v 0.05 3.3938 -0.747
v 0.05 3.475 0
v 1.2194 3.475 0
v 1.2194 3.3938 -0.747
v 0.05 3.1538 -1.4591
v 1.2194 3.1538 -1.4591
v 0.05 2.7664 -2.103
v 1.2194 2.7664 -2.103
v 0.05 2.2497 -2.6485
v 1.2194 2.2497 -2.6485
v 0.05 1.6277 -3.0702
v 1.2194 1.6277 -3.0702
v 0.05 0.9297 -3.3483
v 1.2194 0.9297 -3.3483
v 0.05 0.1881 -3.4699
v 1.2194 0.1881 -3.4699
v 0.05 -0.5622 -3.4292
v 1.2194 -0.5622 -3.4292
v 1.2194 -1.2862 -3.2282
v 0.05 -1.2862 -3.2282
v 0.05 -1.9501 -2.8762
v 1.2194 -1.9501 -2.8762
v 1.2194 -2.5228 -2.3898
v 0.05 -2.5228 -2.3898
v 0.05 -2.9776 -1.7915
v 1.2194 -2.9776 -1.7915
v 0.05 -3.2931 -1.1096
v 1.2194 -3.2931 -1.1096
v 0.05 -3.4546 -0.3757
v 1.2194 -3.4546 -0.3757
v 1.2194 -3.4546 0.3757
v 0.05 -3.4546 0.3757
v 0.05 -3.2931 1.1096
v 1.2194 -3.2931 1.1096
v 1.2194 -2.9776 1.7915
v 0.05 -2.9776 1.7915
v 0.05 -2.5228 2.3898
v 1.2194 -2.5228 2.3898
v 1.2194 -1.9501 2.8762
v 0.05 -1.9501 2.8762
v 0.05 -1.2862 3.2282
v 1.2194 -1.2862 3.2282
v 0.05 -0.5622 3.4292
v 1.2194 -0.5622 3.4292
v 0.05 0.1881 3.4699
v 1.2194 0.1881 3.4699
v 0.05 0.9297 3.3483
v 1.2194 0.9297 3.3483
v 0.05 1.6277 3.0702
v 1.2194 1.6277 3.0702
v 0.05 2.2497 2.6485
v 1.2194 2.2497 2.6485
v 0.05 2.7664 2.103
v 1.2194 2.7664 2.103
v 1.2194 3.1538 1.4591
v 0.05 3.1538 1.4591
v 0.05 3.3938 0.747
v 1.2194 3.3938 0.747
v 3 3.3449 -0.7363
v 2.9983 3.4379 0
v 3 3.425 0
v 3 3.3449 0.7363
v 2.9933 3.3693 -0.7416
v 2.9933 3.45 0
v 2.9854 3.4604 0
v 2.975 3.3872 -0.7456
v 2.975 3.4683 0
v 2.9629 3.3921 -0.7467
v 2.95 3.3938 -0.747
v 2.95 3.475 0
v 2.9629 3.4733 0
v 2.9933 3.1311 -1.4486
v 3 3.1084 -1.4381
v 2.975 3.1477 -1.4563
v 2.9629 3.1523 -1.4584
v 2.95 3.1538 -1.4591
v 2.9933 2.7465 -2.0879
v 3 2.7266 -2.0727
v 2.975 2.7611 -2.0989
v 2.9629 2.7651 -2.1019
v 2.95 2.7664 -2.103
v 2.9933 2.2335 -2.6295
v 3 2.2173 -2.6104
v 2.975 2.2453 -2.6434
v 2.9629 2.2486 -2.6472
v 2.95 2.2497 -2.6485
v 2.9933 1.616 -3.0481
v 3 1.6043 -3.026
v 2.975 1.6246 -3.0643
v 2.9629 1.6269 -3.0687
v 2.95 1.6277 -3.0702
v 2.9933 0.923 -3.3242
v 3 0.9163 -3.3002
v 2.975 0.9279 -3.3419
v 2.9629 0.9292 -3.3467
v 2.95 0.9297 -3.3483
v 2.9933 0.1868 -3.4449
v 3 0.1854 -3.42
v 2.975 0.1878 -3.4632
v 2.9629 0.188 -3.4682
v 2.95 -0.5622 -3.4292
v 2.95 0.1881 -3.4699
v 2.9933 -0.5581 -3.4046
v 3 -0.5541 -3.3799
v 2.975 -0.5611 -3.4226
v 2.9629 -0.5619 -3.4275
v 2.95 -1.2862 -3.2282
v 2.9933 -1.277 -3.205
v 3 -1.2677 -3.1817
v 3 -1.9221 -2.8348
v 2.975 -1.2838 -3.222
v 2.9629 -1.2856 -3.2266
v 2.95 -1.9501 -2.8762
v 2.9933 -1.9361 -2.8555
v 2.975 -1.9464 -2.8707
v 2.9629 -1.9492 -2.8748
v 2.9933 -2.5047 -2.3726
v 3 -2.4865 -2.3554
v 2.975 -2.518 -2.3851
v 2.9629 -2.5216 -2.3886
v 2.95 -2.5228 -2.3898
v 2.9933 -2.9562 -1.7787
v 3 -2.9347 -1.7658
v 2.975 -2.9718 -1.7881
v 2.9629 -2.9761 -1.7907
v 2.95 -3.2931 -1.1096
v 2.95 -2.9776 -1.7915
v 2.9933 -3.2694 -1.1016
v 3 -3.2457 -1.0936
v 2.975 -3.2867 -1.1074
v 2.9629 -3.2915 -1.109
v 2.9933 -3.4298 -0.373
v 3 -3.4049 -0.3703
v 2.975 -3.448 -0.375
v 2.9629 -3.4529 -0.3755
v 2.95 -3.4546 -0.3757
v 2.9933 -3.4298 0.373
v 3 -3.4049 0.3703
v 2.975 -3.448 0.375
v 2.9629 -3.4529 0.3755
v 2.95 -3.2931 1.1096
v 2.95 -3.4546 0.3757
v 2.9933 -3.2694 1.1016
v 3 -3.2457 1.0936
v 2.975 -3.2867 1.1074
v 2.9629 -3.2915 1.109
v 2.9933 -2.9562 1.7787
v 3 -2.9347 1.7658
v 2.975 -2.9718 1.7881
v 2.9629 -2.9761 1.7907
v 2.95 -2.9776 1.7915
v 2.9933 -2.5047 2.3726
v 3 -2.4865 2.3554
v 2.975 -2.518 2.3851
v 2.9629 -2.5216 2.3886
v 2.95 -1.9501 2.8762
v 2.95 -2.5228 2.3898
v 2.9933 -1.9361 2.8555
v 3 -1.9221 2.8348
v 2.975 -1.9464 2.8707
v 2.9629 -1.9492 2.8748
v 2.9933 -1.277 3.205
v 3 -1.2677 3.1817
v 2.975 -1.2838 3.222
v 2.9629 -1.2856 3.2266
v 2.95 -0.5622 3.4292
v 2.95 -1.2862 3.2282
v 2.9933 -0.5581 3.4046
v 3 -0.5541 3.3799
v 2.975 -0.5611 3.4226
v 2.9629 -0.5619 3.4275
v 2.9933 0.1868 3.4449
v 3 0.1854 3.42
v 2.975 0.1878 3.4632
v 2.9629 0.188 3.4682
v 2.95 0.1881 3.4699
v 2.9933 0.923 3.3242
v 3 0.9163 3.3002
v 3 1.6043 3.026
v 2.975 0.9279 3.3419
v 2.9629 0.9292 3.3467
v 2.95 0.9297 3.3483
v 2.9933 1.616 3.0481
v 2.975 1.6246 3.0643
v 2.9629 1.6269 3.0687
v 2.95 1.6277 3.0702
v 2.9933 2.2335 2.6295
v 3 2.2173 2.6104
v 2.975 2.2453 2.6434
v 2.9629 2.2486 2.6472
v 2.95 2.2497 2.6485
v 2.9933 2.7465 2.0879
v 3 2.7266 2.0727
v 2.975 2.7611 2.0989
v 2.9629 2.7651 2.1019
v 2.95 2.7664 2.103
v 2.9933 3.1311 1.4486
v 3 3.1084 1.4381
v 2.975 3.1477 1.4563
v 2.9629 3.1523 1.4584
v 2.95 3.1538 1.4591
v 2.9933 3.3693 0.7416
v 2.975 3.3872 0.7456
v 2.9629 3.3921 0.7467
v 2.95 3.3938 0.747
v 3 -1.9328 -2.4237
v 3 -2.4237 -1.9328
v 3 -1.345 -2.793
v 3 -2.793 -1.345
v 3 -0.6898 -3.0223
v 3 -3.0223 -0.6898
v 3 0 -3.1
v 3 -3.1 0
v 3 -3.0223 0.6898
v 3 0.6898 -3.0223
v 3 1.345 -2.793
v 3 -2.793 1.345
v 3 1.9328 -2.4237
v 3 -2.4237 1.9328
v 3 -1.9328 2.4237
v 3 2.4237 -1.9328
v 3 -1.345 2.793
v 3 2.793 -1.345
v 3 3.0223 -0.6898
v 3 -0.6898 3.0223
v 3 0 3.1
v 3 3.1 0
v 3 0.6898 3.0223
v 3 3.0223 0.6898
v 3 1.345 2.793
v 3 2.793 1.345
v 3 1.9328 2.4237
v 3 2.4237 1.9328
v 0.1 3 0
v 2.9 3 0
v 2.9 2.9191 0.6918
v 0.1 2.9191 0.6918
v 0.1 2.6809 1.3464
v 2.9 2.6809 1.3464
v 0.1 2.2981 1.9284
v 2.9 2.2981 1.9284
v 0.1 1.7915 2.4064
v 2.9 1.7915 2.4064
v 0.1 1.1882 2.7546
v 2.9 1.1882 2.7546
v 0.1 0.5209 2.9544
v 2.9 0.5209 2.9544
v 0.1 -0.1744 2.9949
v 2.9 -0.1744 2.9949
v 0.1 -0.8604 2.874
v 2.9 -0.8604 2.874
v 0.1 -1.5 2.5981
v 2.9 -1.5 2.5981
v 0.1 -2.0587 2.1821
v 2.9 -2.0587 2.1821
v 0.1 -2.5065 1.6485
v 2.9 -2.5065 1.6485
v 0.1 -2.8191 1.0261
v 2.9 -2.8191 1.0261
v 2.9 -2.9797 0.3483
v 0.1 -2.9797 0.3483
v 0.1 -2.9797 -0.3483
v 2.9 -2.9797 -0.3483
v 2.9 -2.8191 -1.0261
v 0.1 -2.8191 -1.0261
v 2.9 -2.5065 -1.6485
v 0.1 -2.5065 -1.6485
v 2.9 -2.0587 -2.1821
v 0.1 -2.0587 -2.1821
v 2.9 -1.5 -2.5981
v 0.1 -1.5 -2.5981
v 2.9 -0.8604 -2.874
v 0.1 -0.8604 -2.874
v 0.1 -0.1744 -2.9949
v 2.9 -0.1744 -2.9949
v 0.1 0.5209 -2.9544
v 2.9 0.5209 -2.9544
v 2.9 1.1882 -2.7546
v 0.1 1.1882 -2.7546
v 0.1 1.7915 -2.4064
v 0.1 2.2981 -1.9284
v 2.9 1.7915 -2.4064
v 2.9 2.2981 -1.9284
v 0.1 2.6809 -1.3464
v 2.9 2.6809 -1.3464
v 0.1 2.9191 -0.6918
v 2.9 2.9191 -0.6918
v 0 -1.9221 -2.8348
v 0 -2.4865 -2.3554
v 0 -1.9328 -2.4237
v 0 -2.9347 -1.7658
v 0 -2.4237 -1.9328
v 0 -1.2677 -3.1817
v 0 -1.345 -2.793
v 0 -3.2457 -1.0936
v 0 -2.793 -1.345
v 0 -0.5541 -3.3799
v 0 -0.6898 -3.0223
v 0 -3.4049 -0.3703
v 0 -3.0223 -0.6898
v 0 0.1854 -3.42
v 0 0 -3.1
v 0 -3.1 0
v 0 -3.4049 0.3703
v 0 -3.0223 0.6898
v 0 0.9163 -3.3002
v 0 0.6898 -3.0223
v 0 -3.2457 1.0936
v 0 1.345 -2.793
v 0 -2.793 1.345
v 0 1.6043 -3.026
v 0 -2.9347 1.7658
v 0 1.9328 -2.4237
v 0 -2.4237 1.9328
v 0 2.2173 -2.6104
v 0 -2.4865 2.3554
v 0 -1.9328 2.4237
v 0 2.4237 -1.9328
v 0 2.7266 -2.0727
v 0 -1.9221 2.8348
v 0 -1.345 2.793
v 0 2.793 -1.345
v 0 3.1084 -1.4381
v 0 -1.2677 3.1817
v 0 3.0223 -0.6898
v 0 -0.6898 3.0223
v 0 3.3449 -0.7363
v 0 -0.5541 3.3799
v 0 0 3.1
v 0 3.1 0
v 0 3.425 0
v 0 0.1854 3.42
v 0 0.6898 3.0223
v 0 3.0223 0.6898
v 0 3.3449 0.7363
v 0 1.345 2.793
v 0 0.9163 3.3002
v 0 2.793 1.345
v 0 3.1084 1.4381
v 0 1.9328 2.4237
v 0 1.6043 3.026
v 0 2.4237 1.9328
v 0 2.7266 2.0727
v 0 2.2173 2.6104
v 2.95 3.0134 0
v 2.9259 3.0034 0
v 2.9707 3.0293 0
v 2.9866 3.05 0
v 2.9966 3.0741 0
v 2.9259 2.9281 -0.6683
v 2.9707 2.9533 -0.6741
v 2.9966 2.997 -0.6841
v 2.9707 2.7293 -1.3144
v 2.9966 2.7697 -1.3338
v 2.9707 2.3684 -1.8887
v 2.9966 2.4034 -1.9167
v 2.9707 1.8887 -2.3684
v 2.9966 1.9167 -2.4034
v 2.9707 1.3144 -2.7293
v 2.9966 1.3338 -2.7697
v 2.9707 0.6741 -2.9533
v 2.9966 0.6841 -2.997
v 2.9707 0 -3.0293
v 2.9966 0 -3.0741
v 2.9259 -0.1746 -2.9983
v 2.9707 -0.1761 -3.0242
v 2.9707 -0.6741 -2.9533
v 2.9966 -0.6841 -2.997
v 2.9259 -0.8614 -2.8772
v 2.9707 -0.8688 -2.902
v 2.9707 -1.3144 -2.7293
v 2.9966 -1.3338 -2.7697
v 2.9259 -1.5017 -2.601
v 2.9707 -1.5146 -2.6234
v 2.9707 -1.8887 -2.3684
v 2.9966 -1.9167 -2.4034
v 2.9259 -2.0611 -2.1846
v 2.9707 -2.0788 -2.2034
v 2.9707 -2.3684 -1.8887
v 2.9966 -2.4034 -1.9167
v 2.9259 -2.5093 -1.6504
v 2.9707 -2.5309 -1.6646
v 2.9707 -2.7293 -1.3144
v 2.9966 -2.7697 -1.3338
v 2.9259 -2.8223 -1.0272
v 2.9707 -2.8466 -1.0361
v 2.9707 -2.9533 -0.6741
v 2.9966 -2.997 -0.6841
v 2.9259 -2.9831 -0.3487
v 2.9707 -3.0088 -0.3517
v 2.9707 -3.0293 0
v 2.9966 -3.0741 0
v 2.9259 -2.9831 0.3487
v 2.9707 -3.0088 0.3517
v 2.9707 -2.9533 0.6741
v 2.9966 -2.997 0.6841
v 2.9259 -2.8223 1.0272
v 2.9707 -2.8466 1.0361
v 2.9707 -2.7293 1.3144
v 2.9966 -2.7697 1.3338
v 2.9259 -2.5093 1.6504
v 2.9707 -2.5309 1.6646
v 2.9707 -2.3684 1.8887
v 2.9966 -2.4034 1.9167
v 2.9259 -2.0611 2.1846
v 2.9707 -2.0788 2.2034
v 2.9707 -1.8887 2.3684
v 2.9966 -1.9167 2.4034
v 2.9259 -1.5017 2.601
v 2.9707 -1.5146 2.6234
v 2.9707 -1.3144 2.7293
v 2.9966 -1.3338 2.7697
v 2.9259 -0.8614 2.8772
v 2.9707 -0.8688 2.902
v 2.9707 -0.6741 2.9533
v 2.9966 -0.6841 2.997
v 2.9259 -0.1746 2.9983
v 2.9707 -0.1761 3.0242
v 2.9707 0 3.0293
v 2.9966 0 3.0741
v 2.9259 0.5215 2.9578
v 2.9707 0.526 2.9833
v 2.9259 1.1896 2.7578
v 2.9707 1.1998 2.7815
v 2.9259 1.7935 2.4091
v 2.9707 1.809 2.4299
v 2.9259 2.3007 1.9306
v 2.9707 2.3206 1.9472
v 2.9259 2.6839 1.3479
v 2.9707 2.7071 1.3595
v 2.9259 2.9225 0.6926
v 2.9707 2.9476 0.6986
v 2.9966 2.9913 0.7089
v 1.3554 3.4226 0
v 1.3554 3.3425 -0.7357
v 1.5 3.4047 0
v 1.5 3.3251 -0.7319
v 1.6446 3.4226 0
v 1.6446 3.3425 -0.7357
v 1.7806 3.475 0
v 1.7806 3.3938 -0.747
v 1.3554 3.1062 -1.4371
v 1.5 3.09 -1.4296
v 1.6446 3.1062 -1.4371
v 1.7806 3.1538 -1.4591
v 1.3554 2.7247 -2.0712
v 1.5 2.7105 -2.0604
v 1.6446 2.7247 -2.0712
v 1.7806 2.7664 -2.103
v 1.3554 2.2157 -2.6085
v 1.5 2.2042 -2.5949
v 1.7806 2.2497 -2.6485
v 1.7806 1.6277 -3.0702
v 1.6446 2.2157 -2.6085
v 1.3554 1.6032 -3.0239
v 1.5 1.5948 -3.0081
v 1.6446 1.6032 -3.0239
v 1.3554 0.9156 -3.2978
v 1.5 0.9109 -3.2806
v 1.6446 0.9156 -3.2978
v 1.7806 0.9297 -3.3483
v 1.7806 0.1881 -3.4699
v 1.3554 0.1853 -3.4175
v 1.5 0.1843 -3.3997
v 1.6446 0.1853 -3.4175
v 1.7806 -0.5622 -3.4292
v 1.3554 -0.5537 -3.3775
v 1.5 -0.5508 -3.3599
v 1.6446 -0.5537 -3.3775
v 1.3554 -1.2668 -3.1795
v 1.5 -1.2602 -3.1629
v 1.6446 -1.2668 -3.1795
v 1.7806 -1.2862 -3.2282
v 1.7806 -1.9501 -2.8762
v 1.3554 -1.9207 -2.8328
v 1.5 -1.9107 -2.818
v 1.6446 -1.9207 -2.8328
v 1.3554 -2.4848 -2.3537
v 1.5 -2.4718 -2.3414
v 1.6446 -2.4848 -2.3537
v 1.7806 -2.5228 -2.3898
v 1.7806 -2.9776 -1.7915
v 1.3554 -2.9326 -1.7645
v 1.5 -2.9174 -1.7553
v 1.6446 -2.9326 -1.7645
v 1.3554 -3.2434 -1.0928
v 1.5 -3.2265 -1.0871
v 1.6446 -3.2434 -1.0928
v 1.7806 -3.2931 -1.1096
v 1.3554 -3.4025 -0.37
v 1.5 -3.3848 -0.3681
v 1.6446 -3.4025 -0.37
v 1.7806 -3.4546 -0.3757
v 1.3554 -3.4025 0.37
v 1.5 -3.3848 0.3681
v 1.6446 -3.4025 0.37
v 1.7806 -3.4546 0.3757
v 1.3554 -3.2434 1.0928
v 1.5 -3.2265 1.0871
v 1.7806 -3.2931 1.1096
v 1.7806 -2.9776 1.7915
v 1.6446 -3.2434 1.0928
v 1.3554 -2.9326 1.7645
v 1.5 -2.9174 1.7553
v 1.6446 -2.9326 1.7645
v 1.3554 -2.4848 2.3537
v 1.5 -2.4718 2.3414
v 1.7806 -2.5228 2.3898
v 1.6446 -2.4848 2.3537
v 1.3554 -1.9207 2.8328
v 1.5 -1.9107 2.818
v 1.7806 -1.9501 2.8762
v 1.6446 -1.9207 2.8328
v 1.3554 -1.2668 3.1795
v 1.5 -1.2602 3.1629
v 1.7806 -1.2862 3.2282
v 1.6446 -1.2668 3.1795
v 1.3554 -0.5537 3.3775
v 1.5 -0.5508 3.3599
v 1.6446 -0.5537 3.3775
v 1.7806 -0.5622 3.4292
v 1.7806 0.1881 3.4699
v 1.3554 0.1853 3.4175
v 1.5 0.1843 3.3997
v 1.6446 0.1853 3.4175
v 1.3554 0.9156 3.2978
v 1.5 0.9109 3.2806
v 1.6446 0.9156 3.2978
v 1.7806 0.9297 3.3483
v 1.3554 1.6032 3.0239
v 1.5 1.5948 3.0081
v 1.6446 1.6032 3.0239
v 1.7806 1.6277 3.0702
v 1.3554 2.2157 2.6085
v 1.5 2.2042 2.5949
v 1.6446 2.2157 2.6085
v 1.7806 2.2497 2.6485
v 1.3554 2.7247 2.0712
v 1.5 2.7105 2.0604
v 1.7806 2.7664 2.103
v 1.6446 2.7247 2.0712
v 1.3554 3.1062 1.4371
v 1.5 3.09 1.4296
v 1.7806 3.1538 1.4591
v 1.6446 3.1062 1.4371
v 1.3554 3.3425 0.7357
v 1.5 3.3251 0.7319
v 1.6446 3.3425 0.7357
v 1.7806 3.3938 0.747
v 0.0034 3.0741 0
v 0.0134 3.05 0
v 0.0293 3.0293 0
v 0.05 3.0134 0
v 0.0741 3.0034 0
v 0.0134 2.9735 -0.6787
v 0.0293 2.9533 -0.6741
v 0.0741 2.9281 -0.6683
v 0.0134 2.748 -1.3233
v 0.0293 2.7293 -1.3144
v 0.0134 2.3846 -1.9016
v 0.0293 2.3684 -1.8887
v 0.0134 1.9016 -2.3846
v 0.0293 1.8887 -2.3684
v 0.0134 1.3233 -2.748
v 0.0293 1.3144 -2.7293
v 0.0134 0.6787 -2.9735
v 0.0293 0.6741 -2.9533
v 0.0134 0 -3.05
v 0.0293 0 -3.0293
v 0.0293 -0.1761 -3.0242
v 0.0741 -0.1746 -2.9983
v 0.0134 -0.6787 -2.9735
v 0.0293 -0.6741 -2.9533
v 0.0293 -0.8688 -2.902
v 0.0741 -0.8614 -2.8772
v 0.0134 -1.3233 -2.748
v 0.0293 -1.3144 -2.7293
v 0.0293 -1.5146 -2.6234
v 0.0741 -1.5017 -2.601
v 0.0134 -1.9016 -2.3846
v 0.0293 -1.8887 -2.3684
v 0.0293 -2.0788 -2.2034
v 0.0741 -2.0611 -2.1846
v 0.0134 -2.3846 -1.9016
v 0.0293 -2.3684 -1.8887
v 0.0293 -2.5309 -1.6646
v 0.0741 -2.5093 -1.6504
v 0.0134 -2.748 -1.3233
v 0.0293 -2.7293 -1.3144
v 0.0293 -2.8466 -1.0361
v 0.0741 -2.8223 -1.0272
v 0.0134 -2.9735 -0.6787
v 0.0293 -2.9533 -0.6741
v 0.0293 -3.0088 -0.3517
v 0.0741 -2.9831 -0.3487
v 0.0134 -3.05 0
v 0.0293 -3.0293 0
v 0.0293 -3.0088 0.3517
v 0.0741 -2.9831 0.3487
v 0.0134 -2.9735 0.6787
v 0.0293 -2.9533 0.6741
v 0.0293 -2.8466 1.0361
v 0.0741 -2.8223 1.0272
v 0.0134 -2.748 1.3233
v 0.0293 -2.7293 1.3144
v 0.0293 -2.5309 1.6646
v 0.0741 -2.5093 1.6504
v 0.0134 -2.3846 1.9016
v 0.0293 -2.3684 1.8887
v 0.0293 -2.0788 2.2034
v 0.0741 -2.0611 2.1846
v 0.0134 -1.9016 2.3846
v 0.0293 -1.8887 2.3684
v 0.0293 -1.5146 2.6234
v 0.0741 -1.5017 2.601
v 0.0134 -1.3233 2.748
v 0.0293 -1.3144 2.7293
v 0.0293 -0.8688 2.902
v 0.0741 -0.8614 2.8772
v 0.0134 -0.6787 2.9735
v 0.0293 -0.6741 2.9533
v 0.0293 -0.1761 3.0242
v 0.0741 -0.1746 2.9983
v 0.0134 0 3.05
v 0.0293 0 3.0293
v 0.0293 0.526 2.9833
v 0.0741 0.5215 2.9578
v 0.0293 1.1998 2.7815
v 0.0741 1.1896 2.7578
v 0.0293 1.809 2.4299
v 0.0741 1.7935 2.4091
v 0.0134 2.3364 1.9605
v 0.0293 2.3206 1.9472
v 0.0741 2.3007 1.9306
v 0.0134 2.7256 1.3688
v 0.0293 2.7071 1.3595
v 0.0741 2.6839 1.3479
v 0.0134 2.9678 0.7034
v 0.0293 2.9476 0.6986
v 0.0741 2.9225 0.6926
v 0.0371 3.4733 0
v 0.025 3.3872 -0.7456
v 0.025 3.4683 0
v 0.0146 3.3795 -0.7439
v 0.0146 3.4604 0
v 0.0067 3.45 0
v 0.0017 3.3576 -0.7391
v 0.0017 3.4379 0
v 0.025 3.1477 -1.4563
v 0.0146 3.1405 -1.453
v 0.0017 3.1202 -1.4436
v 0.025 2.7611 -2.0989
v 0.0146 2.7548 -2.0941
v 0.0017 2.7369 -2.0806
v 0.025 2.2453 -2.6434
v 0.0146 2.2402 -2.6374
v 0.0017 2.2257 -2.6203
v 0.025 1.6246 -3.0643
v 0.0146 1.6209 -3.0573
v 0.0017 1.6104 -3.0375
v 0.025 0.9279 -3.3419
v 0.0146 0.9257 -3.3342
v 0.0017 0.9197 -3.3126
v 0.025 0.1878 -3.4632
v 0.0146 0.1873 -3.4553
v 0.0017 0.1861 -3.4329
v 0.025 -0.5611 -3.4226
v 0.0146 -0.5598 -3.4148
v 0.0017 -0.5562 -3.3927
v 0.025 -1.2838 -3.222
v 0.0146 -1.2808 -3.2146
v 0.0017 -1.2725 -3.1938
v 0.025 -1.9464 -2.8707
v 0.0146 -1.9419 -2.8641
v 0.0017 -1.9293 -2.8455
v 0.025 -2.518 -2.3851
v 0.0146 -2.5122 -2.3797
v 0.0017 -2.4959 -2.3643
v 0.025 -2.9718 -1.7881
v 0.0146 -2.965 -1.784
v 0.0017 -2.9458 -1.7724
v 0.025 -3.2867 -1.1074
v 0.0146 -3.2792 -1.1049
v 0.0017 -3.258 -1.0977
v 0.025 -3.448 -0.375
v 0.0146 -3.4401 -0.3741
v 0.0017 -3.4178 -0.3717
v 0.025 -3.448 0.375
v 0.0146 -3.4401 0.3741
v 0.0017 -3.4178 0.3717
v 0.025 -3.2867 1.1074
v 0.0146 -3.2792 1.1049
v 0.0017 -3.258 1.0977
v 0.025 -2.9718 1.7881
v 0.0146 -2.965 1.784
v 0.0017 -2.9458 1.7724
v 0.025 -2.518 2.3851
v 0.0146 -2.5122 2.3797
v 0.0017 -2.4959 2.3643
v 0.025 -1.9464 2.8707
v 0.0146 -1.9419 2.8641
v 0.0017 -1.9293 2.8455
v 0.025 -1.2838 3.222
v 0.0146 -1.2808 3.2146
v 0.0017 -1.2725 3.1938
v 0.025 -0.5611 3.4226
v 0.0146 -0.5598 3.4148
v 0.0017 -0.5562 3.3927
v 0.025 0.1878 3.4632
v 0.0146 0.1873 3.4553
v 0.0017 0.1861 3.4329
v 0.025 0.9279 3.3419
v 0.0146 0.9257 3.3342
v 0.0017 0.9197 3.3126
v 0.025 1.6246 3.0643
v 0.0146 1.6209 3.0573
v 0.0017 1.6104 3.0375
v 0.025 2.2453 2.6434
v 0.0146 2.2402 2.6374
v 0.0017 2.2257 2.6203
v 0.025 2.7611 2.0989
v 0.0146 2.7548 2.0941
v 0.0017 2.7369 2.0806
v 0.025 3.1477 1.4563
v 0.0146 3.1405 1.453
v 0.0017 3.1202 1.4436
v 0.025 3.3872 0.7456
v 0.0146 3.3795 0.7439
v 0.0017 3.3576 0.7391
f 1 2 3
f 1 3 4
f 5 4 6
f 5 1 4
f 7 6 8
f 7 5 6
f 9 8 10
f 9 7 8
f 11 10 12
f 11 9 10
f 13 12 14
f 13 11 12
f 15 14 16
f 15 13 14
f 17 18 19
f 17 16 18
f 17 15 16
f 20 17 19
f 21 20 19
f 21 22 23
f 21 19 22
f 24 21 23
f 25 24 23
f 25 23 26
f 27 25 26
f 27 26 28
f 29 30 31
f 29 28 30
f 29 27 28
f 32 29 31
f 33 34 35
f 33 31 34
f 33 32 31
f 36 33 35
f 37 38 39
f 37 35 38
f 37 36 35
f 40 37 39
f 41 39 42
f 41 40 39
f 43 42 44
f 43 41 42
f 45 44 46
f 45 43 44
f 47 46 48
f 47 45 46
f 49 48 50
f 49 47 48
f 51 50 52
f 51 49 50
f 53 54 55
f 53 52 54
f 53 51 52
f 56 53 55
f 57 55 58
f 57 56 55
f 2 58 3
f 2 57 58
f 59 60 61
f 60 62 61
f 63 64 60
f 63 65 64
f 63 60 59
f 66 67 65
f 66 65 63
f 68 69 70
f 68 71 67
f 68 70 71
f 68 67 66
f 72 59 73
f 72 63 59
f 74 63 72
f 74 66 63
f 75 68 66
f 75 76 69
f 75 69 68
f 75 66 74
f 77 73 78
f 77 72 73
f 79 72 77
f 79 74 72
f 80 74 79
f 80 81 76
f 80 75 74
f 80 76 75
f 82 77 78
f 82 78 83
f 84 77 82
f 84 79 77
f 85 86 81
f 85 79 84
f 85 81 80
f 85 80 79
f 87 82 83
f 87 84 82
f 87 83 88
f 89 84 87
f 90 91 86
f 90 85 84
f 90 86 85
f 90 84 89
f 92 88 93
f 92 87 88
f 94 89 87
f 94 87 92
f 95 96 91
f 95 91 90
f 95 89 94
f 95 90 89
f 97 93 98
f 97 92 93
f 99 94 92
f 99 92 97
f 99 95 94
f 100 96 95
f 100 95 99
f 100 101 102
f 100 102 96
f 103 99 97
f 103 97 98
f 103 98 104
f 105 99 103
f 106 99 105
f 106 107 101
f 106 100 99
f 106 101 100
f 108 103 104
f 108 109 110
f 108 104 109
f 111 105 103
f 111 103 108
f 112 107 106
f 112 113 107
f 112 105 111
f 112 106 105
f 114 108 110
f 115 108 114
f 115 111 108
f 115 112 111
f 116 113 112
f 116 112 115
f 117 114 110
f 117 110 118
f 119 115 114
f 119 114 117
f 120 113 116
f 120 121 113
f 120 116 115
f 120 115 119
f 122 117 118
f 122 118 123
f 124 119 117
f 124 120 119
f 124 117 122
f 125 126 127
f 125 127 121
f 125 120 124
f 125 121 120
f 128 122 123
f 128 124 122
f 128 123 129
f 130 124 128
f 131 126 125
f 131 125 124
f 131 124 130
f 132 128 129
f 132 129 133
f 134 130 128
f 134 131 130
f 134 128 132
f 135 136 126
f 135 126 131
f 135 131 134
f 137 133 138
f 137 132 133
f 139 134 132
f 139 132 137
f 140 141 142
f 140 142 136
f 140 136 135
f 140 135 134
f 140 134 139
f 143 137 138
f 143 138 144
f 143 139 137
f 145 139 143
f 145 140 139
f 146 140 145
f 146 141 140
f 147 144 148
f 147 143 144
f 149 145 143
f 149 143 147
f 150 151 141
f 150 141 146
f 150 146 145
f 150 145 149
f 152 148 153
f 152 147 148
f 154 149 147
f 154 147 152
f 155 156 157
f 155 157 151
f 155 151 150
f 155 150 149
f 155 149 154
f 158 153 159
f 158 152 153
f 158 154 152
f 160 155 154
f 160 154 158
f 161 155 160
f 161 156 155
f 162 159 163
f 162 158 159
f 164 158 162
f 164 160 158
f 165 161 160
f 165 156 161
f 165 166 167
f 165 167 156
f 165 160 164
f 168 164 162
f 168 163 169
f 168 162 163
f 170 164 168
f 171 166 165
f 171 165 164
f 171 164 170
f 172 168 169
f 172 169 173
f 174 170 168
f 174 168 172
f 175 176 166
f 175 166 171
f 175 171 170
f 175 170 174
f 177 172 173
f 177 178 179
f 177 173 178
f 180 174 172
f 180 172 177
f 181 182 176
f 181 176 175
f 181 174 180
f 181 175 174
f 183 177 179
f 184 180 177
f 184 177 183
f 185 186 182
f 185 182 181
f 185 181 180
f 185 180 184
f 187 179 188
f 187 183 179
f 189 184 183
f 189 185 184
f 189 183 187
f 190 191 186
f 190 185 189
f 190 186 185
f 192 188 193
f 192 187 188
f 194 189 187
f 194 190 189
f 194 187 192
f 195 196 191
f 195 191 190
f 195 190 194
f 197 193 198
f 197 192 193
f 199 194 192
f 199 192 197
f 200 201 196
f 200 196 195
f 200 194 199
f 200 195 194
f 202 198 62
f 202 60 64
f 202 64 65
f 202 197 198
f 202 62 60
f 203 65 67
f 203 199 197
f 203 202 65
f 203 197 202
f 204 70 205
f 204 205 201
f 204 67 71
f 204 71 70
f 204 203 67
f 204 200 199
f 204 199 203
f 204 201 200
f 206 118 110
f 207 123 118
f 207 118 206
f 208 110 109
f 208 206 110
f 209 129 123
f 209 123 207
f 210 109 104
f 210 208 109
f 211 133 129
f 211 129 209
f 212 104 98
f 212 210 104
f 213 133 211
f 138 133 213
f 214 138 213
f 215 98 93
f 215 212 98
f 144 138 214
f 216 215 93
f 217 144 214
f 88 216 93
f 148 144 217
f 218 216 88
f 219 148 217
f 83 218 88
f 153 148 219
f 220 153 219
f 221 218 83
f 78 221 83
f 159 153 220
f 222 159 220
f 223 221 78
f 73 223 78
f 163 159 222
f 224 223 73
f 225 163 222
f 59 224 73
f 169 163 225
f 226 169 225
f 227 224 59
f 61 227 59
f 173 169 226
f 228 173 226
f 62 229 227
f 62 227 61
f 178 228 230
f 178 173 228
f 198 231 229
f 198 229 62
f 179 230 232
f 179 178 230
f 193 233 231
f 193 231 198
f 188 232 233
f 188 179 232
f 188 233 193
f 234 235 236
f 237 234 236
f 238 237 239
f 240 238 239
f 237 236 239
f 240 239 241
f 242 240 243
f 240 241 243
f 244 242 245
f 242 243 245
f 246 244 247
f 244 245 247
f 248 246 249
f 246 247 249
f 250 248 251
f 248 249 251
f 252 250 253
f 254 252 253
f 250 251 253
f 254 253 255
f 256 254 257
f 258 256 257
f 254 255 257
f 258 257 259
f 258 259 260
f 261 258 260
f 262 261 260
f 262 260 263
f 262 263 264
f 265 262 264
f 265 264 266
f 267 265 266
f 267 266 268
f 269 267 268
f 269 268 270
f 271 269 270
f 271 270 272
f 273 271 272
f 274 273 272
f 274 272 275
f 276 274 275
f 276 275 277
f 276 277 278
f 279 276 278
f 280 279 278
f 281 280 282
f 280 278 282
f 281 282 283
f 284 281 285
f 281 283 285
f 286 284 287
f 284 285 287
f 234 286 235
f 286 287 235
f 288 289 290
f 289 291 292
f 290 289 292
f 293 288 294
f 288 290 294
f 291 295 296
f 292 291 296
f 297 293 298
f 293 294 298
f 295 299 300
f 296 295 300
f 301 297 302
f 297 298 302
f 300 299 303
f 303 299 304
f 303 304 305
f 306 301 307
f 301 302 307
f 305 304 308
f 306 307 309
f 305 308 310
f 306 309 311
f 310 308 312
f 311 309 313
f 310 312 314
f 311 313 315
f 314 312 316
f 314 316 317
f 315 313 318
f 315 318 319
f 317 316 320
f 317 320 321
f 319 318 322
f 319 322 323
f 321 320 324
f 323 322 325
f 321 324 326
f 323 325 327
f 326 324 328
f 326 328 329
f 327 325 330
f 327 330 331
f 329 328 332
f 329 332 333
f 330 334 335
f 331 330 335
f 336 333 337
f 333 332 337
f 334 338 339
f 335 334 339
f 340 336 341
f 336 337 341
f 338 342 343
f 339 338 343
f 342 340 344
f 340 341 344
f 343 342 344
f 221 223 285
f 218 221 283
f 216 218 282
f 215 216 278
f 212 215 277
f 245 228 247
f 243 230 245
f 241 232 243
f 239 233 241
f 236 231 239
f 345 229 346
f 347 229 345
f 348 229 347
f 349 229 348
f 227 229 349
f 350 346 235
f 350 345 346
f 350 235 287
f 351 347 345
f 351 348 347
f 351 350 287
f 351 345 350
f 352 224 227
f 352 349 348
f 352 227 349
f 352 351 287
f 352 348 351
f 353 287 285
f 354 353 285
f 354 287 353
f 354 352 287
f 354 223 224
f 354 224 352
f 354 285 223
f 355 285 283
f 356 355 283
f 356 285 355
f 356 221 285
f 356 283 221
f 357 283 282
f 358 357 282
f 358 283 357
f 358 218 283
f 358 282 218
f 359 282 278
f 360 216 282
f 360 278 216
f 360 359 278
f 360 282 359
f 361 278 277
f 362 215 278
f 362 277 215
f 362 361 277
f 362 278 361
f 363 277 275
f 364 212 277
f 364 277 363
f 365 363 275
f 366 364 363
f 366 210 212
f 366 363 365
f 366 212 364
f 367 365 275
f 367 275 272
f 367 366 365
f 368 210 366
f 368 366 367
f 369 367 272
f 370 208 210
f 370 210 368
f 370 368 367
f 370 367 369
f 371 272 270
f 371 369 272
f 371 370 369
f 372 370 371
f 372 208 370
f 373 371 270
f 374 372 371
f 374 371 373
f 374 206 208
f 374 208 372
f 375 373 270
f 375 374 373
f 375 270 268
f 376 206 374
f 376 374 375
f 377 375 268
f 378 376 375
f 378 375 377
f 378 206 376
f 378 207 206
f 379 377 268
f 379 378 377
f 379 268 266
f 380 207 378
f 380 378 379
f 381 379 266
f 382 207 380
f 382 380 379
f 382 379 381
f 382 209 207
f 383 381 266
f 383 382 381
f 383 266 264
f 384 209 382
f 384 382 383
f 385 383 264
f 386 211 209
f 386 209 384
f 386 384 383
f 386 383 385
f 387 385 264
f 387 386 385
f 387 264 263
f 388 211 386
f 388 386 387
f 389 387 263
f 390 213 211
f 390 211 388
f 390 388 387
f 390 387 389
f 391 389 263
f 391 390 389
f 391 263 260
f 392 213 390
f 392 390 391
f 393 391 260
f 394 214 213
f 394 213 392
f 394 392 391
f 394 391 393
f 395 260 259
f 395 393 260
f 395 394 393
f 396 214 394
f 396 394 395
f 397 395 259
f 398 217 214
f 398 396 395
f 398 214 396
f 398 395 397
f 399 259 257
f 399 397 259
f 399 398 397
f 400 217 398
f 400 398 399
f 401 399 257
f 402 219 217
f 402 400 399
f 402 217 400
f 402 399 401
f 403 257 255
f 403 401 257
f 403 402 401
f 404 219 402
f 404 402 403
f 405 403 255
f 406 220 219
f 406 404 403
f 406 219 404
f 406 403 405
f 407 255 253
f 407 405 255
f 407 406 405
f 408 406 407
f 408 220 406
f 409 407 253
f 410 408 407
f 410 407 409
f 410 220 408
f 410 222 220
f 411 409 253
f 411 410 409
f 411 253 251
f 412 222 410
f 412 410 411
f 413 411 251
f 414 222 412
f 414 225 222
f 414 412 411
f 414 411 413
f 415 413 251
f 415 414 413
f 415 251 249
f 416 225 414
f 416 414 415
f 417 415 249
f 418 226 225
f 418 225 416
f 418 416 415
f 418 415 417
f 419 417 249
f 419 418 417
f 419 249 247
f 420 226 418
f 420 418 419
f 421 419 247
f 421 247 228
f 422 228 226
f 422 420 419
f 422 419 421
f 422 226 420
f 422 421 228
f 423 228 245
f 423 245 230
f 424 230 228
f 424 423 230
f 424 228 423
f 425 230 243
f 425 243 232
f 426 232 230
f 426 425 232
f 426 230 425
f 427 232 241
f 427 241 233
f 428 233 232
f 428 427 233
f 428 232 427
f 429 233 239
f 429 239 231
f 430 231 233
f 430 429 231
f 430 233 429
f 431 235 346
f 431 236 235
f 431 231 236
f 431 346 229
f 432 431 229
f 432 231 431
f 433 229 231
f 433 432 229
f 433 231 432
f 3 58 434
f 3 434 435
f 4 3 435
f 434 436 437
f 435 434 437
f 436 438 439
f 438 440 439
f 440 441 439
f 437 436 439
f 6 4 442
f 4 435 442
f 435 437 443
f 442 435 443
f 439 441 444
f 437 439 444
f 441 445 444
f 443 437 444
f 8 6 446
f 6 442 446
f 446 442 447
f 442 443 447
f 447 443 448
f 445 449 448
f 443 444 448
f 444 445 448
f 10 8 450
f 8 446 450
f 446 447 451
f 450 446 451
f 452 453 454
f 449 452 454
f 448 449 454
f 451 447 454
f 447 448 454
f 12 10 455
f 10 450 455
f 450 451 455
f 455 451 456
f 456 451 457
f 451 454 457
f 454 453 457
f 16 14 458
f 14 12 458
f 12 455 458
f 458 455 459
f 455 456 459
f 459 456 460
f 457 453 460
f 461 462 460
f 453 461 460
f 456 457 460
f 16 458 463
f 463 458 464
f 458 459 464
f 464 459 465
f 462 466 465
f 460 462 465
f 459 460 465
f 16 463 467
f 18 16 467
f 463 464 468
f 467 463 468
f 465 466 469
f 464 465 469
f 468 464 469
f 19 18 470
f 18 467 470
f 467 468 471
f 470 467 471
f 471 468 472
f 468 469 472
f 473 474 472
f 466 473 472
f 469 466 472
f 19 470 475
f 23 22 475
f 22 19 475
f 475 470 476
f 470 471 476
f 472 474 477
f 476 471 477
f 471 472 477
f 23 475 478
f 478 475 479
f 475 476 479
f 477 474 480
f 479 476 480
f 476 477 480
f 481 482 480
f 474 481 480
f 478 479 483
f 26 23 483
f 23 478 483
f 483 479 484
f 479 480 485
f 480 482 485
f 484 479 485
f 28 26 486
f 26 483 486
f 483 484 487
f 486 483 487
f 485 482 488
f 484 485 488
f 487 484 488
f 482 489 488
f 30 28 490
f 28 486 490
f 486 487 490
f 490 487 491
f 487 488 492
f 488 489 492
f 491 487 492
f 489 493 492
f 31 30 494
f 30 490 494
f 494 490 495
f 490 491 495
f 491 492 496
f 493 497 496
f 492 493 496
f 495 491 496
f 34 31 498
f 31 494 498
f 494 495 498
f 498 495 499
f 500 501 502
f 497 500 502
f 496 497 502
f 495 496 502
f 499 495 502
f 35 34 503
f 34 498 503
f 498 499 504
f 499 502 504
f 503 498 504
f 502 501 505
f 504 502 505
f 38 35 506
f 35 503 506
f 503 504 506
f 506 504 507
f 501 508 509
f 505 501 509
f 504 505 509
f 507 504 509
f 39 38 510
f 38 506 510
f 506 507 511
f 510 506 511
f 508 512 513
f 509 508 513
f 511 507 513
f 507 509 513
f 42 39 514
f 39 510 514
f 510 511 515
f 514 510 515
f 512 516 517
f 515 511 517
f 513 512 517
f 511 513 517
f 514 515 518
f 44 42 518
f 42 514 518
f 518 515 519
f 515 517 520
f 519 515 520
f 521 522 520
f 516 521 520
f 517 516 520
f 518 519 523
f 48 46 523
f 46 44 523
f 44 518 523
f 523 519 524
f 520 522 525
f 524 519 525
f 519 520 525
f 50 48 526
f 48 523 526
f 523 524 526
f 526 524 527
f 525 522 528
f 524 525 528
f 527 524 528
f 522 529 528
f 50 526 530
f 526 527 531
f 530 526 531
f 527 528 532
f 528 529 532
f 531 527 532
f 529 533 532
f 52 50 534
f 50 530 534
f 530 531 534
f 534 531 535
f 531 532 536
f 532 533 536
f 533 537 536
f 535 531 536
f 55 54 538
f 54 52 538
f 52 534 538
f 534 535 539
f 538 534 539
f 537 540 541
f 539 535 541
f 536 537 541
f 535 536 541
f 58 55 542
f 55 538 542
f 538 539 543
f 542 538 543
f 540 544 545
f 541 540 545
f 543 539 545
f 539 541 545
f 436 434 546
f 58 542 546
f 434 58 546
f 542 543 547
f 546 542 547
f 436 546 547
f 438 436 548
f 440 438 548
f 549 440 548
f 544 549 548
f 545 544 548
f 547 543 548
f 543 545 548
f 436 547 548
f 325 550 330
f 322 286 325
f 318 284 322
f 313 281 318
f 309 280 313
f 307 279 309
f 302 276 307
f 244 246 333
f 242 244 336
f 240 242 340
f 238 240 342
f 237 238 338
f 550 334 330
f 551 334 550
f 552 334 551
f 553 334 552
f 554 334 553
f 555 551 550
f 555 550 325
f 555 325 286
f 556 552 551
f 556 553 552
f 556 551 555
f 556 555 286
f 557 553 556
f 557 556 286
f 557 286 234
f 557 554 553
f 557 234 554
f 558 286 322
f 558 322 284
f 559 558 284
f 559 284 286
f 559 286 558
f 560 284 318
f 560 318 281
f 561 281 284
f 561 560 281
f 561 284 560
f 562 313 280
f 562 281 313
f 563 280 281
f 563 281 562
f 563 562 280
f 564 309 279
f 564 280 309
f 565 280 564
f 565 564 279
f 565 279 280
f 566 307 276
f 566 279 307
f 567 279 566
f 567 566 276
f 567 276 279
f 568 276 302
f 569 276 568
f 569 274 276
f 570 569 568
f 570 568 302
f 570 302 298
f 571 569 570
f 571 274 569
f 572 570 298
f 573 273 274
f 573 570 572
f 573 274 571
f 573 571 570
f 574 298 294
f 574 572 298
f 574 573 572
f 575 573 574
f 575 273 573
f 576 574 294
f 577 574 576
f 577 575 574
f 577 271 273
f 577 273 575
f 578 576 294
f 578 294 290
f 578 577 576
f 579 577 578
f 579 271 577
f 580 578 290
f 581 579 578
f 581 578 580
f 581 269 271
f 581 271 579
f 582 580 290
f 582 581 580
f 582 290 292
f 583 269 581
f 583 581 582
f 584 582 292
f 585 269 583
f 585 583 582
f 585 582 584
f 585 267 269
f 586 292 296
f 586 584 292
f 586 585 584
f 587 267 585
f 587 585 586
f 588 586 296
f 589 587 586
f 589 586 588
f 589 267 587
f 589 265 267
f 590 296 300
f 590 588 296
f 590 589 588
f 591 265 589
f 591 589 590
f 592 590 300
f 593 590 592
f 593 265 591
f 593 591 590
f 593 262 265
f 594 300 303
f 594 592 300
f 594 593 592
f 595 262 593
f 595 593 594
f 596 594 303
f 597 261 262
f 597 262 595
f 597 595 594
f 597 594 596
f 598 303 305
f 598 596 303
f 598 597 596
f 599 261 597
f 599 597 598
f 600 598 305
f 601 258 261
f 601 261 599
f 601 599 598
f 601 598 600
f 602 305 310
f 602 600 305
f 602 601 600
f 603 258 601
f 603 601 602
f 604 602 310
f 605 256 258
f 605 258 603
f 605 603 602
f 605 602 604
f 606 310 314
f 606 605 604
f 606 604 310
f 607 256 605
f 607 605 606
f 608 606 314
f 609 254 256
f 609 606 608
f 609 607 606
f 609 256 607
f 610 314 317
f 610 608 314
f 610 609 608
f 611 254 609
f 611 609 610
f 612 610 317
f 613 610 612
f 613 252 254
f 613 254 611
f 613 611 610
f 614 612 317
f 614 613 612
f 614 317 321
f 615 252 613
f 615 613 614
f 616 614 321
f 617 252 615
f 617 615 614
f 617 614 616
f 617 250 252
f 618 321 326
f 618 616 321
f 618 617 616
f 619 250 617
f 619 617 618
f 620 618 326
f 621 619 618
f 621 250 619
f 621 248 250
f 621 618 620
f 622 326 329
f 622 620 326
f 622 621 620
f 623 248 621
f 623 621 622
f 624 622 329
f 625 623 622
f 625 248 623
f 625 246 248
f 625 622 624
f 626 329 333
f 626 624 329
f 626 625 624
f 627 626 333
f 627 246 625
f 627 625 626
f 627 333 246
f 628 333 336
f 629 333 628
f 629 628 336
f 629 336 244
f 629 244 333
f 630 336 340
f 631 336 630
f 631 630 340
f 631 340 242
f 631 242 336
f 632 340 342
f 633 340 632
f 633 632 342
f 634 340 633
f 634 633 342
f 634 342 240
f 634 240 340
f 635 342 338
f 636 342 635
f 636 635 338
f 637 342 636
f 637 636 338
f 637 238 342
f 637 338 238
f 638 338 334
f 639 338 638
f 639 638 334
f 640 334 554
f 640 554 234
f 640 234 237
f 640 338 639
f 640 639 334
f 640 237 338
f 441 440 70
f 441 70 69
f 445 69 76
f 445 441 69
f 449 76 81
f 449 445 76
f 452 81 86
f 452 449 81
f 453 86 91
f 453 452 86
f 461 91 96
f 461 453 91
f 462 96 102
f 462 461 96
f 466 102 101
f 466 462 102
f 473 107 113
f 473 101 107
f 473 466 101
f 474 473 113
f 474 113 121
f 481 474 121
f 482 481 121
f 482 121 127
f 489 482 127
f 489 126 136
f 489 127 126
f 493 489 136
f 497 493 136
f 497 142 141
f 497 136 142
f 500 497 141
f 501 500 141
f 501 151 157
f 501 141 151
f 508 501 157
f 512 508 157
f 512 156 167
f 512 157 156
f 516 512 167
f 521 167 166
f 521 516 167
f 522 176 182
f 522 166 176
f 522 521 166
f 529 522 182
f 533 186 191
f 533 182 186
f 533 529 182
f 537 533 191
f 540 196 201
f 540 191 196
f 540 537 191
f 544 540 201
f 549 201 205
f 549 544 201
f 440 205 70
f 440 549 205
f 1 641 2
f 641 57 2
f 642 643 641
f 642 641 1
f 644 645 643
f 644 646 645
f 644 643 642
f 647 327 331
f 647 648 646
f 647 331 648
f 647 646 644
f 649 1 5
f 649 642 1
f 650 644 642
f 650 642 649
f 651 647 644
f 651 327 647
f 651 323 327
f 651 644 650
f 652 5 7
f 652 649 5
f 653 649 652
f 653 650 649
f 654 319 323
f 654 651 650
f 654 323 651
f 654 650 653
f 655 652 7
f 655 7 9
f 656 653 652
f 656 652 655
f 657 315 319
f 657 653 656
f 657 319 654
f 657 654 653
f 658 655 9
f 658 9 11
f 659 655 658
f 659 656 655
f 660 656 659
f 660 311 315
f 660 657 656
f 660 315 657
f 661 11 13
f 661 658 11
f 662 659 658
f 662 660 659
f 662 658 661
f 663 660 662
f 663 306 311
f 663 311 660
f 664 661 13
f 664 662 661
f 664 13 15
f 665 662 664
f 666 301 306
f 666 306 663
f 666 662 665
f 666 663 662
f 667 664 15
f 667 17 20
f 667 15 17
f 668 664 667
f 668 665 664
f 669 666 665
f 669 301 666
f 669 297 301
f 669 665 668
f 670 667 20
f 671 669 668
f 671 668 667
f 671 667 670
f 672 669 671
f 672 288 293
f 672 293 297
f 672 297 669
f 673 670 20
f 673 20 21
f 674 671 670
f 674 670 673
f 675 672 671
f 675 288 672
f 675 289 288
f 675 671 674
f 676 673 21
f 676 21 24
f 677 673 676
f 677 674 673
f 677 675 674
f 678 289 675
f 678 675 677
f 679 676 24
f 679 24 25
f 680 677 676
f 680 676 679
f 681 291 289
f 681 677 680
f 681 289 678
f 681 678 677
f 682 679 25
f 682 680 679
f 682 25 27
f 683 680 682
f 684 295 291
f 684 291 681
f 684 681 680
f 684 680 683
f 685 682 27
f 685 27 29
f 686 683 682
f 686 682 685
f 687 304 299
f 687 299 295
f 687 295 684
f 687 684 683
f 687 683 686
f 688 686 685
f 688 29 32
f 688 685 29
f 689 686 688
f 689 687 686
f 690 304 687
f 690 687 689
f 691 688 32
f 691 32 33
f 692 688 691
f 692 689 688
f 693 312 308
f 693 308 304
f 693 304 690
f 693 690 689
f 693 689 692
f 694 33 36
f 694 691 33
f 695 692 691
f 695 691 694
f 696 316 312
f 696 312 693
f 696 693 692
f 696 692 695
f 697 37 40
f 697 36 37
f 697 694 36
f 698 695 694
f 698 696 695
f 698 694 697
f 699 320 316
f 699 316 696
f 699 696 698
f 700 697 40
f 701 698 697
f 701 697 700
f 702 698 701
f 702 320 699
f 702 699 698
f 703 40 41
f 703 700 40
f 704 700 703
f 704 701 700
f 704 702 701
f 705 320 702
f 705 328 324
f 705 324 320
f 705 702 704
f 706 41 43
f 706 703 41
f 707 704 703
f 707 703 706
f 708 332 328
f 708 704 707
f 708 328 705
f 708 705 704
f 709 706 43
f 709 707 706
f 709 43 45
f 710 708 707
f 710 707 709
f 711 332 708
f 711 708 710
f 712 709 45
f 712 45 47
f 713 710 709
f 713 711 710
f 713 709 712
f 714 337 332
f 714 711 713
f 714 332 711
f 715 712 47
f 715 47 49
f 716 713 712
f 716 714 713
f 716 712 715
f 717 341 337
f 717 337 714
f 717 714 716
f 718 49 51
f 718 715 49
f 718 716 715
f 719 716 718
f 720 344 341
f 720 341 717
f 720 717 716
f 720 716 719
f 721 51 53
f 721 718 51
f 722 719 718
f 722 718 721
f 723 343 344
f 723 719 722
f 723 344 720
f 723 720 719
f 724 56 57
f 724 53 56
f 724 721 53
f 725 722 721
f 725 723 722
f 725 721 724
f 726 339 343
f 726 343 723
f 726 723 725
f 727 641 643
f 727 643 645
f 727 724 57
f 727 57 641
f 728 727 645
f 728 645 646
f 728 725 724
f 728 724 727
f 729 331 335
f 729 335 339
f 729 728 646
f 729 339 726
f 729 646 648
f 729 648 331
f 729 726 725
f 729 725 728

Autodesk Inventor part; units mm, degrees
sketch "Sketch_5" plane through (0, 0, 0) normal (0, 0, 1) x (1, 0, 0)
  line L0 (3, 0) -> (0, 0)
  line L1 (0, 3.425) -> (0, 3.1)
  arc A0 (0, 3.1) -> (0.1, 3) centre (0.1, 3.1) ccw
  line L2 (0.1, 3) -> (2.9, 3)
  arc A1 (2.9, 3) -> (3, 3.1) centre (2.9, 3.1) ccw
  line L3 (3, 3.1) -> (3, 3.425)
  arc A2 (3, 3.425) -> (2.95, 3.475) centre (2.95, 3.425) ccw
  line L4 (2.95, 3.475) -> (1.7806, 3.475)
  arc A3 (1.2194, 3.475) -> (1.7806, 3.475) centre (1.5, 4) ccw
  line L5 (1.2194, 3.475) -> (0.05, 3.475)
  arc A4 (0.05, 3.475) -> (0, 3.425) centre (0.05, 3.425) ccw
revolve "Revolution1" add sketch "Sketch_5" angle 360 about axis through (3, 0, 0) along (1, 0, 0)
ref_plane "1_XY" through (1.5, 0, 0) normal (1, 0, 0) x (0, 0, -1)
ref_plane "1_YZ" through (1.5, 0, 0) normal (0, 0, -1) x (0, 1, 0)
ref_plane "1_ZX" through (1.5, 0, 0) normal (0, 1, 0) x (1, 0, 0)
ref_plane "Dummy_XY" through (0, 0, 0) normal (1, 0, 0) x (0, 0, -1)
ref_plane "Dummy_YZ" through (0, 0, 0) normal (0, 0, -1) x (0, 1, 0)
ref_plane "Dummy_ZX" through (0, 0, 0) normal (0, 1, 0) x (1, 0, 0)
ref_plane "shield1_XY" through (0.4, 0, 0) normal (1, 0, 0) x (0, 0, -1)
ref_plane "shield1_YZ" through (0.4, 0, 0) normal (0, 0, -1) x (0, 1, 0)
ref_plane "shield1_ZX" through (0.4, 0, 0) normal (0, 1, 0) x (1, 0, 0)
ref_plane "shield2_XY" through (2.6, 0, 0) normal (-1, 0, 0) x (0, 0, -1)
ref_plane "shield2_YZ" through (2.6, 0, 0) normal (0, 0, -1) x (0, -1, 0)
ref_plane "shield2_ZX" through (2.6, 0, 0) normal (0, -1, 0) x (-1, 0, 0)
properties part number "LF-1060ZZ_ir" material "鋼、炭素鋼"
